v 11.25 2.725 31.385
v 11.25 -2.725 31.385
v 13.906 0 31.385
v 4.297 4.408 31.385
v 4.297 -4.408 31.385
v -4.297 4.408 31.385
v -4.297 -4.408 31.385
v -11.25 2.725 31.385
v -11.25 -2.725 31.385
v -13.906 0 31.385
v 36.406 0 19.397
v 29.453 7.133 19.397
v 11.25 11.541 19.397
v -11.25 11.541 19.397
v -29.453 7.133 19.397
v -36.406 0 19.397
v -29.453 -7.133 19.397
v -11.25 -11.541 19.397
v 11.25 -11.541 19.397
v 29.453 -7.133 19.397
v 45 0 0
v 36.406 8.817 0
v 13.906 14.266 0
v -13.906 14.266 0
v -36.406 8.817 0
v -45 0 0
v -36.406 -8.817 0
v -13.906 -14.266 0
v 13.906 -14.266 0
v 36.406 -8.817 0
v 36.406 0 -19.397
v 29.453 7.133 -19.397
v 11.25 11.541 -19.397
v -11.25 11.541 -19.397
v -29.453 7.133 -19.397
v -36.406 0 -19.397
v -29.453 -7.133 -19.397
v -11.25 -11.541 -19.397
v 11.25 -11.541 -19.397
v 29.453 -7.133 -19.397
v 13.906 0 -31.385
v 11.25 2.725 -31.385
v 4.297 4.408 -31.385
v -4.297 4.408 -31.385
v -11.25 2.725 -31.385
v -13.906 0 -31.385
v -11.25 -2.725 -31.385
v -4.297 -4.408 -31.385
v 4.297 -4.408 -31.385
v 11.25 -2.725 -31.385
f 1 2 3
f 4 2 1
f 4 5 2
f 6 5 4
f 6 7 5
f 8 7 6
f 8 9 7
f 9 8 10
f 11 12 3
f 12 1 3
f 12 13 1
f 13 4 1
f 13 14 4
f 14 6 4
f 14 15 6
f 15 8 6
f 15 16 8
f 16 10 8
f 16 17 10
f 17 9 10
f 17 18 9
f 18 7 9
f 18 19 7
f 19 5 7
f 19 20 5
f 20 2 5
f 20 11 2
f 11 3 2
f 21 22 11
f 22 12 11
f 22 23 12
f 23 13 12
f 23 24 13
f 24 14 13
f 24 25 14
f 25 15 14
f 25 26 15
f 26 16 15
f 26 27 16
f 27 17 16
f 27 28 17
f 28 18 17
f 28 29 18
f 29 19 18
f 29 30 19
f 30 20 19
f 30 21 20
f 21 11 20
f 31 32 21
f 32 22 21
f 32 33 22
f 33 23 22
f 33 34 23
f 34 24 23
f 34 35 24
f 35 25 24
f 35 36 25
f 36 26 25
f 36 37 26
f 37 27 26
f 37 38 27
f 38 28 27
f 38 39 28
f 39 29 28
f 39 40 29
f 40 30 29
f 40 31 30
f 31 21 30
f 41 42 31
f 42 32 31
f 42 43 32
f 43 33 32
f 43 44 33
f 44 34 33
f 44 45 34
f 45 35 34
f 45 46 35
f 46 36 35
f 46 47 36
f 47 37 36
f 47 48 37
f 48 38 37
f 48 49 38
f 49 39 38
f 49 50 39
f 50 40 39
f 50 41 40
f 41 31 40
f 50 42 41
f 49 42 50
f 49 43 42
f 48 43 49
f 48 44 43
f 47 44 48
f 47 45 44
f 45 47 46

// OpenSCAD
// Generated by SolidPython 1.0.1 on 2020-07-29 00:46:51


scale(v = [15, 5, 11]) {
	sphere(r = 3);
}
/***********************************************
*********      SolidPython code:      **********
************************************************
 
# import packages: SolidPython
from solid import *
from solid.utils import *
from itertools import chain, combinations, permutations


class Resize:

    def __init__(self, scad_file):
        self.scad_file = scad_file
        #self.scad_file = import_scad(scad_file)
        # cone/cylinder param:
        self.r1 = 0
        self.r2 = 0
        self.h = 0
        # rectangular prism param:
        self.w = 0
        self.l = 0
        # ellipse param:
        self.r = 0

    # import OpenScad code (file name corresponds to shape)


    # classify shape + parameters
    def assign(self, param1, param2, param3):
        if self.scad_file == 'cone.scad':
            self.r1 = param1
            self.r2 = param2
            self.h = param3
        elif self.scad_file == 'cylinder.scad':
            self.r1 = param1
            self.r2 = param2
            self.h = param3
        elif self.scad_file == 'rectangularPrism.scad':
            self.h = param1
            self.l = param2
            self.w = param3
        else:
            self.r = param1
            self.h = param2

    # resize parameters
    def iterate(self):
        x = range(3, 20, 2)
        i = 1
        if self.scad_file == 'cone.scad':
            tempList = list(permutations(x, 2))
            for temp in tempList:
                param1 = temp[0]
                param2 = temp[1]
                filepath = 'produced_scad_files/' + 'cone' + str(param1) + '_' + str(param2) + '_' + '.scad'
                scad_render_to_file(cylinder(h=param1, r1=param2, r2=0), filepath)

        elif self.scad_file == 'cylinder.scad':
            tempList = list(permutations(x, 3))
            for temp in tempList:
                param1 = temp[0]
                param2 = temp[1]
                filepath = 'produced_scad_files/' + 'cylinder' + str(param1) + '_' + str(param2) + '_' + '.scad'
                scad_render_to_file(cylinder(h=param1, r1=param2, r2=param2), filepath)

        elif self.scad_file == 'rectangularPrism.scad':
            tempList = list(permutations(x, 3))
            for temp in tempList:
                param1 = temp[0]
                param2 = temp[1]
                param3 = temp[2]
                filepath = 'produced_scad_files/' + 'rectangularPrism' + str(param1) + '_' + str(param2) + '_' + str(
                    param3) + '.scad'
                scad_render_to_file(cube(size=(param1, param2, param3)), filepath)

        elif self.scad_file == 'ellipse.scad':
            tempList = list(permutations(x, 4))
            for temp in tempList:
                param1 = temp[0]
                param2 = temp[1]
                param3 = temp[2]
                param4 = temp[3]
                filepath = 'produced_scad_files/' + 'ellipse' + str(param1) + '_' + str(param2) + '_' + str(param3) + '_' + str(param4) + '.scad'
                scad_render_to_file(scale([param1, param2, param3])(sphere(r=param4)), filepath)

    def render_to_scadfile(self):
        scad_render_to_file(scad, 'example.scad') 
 
************************************************/
